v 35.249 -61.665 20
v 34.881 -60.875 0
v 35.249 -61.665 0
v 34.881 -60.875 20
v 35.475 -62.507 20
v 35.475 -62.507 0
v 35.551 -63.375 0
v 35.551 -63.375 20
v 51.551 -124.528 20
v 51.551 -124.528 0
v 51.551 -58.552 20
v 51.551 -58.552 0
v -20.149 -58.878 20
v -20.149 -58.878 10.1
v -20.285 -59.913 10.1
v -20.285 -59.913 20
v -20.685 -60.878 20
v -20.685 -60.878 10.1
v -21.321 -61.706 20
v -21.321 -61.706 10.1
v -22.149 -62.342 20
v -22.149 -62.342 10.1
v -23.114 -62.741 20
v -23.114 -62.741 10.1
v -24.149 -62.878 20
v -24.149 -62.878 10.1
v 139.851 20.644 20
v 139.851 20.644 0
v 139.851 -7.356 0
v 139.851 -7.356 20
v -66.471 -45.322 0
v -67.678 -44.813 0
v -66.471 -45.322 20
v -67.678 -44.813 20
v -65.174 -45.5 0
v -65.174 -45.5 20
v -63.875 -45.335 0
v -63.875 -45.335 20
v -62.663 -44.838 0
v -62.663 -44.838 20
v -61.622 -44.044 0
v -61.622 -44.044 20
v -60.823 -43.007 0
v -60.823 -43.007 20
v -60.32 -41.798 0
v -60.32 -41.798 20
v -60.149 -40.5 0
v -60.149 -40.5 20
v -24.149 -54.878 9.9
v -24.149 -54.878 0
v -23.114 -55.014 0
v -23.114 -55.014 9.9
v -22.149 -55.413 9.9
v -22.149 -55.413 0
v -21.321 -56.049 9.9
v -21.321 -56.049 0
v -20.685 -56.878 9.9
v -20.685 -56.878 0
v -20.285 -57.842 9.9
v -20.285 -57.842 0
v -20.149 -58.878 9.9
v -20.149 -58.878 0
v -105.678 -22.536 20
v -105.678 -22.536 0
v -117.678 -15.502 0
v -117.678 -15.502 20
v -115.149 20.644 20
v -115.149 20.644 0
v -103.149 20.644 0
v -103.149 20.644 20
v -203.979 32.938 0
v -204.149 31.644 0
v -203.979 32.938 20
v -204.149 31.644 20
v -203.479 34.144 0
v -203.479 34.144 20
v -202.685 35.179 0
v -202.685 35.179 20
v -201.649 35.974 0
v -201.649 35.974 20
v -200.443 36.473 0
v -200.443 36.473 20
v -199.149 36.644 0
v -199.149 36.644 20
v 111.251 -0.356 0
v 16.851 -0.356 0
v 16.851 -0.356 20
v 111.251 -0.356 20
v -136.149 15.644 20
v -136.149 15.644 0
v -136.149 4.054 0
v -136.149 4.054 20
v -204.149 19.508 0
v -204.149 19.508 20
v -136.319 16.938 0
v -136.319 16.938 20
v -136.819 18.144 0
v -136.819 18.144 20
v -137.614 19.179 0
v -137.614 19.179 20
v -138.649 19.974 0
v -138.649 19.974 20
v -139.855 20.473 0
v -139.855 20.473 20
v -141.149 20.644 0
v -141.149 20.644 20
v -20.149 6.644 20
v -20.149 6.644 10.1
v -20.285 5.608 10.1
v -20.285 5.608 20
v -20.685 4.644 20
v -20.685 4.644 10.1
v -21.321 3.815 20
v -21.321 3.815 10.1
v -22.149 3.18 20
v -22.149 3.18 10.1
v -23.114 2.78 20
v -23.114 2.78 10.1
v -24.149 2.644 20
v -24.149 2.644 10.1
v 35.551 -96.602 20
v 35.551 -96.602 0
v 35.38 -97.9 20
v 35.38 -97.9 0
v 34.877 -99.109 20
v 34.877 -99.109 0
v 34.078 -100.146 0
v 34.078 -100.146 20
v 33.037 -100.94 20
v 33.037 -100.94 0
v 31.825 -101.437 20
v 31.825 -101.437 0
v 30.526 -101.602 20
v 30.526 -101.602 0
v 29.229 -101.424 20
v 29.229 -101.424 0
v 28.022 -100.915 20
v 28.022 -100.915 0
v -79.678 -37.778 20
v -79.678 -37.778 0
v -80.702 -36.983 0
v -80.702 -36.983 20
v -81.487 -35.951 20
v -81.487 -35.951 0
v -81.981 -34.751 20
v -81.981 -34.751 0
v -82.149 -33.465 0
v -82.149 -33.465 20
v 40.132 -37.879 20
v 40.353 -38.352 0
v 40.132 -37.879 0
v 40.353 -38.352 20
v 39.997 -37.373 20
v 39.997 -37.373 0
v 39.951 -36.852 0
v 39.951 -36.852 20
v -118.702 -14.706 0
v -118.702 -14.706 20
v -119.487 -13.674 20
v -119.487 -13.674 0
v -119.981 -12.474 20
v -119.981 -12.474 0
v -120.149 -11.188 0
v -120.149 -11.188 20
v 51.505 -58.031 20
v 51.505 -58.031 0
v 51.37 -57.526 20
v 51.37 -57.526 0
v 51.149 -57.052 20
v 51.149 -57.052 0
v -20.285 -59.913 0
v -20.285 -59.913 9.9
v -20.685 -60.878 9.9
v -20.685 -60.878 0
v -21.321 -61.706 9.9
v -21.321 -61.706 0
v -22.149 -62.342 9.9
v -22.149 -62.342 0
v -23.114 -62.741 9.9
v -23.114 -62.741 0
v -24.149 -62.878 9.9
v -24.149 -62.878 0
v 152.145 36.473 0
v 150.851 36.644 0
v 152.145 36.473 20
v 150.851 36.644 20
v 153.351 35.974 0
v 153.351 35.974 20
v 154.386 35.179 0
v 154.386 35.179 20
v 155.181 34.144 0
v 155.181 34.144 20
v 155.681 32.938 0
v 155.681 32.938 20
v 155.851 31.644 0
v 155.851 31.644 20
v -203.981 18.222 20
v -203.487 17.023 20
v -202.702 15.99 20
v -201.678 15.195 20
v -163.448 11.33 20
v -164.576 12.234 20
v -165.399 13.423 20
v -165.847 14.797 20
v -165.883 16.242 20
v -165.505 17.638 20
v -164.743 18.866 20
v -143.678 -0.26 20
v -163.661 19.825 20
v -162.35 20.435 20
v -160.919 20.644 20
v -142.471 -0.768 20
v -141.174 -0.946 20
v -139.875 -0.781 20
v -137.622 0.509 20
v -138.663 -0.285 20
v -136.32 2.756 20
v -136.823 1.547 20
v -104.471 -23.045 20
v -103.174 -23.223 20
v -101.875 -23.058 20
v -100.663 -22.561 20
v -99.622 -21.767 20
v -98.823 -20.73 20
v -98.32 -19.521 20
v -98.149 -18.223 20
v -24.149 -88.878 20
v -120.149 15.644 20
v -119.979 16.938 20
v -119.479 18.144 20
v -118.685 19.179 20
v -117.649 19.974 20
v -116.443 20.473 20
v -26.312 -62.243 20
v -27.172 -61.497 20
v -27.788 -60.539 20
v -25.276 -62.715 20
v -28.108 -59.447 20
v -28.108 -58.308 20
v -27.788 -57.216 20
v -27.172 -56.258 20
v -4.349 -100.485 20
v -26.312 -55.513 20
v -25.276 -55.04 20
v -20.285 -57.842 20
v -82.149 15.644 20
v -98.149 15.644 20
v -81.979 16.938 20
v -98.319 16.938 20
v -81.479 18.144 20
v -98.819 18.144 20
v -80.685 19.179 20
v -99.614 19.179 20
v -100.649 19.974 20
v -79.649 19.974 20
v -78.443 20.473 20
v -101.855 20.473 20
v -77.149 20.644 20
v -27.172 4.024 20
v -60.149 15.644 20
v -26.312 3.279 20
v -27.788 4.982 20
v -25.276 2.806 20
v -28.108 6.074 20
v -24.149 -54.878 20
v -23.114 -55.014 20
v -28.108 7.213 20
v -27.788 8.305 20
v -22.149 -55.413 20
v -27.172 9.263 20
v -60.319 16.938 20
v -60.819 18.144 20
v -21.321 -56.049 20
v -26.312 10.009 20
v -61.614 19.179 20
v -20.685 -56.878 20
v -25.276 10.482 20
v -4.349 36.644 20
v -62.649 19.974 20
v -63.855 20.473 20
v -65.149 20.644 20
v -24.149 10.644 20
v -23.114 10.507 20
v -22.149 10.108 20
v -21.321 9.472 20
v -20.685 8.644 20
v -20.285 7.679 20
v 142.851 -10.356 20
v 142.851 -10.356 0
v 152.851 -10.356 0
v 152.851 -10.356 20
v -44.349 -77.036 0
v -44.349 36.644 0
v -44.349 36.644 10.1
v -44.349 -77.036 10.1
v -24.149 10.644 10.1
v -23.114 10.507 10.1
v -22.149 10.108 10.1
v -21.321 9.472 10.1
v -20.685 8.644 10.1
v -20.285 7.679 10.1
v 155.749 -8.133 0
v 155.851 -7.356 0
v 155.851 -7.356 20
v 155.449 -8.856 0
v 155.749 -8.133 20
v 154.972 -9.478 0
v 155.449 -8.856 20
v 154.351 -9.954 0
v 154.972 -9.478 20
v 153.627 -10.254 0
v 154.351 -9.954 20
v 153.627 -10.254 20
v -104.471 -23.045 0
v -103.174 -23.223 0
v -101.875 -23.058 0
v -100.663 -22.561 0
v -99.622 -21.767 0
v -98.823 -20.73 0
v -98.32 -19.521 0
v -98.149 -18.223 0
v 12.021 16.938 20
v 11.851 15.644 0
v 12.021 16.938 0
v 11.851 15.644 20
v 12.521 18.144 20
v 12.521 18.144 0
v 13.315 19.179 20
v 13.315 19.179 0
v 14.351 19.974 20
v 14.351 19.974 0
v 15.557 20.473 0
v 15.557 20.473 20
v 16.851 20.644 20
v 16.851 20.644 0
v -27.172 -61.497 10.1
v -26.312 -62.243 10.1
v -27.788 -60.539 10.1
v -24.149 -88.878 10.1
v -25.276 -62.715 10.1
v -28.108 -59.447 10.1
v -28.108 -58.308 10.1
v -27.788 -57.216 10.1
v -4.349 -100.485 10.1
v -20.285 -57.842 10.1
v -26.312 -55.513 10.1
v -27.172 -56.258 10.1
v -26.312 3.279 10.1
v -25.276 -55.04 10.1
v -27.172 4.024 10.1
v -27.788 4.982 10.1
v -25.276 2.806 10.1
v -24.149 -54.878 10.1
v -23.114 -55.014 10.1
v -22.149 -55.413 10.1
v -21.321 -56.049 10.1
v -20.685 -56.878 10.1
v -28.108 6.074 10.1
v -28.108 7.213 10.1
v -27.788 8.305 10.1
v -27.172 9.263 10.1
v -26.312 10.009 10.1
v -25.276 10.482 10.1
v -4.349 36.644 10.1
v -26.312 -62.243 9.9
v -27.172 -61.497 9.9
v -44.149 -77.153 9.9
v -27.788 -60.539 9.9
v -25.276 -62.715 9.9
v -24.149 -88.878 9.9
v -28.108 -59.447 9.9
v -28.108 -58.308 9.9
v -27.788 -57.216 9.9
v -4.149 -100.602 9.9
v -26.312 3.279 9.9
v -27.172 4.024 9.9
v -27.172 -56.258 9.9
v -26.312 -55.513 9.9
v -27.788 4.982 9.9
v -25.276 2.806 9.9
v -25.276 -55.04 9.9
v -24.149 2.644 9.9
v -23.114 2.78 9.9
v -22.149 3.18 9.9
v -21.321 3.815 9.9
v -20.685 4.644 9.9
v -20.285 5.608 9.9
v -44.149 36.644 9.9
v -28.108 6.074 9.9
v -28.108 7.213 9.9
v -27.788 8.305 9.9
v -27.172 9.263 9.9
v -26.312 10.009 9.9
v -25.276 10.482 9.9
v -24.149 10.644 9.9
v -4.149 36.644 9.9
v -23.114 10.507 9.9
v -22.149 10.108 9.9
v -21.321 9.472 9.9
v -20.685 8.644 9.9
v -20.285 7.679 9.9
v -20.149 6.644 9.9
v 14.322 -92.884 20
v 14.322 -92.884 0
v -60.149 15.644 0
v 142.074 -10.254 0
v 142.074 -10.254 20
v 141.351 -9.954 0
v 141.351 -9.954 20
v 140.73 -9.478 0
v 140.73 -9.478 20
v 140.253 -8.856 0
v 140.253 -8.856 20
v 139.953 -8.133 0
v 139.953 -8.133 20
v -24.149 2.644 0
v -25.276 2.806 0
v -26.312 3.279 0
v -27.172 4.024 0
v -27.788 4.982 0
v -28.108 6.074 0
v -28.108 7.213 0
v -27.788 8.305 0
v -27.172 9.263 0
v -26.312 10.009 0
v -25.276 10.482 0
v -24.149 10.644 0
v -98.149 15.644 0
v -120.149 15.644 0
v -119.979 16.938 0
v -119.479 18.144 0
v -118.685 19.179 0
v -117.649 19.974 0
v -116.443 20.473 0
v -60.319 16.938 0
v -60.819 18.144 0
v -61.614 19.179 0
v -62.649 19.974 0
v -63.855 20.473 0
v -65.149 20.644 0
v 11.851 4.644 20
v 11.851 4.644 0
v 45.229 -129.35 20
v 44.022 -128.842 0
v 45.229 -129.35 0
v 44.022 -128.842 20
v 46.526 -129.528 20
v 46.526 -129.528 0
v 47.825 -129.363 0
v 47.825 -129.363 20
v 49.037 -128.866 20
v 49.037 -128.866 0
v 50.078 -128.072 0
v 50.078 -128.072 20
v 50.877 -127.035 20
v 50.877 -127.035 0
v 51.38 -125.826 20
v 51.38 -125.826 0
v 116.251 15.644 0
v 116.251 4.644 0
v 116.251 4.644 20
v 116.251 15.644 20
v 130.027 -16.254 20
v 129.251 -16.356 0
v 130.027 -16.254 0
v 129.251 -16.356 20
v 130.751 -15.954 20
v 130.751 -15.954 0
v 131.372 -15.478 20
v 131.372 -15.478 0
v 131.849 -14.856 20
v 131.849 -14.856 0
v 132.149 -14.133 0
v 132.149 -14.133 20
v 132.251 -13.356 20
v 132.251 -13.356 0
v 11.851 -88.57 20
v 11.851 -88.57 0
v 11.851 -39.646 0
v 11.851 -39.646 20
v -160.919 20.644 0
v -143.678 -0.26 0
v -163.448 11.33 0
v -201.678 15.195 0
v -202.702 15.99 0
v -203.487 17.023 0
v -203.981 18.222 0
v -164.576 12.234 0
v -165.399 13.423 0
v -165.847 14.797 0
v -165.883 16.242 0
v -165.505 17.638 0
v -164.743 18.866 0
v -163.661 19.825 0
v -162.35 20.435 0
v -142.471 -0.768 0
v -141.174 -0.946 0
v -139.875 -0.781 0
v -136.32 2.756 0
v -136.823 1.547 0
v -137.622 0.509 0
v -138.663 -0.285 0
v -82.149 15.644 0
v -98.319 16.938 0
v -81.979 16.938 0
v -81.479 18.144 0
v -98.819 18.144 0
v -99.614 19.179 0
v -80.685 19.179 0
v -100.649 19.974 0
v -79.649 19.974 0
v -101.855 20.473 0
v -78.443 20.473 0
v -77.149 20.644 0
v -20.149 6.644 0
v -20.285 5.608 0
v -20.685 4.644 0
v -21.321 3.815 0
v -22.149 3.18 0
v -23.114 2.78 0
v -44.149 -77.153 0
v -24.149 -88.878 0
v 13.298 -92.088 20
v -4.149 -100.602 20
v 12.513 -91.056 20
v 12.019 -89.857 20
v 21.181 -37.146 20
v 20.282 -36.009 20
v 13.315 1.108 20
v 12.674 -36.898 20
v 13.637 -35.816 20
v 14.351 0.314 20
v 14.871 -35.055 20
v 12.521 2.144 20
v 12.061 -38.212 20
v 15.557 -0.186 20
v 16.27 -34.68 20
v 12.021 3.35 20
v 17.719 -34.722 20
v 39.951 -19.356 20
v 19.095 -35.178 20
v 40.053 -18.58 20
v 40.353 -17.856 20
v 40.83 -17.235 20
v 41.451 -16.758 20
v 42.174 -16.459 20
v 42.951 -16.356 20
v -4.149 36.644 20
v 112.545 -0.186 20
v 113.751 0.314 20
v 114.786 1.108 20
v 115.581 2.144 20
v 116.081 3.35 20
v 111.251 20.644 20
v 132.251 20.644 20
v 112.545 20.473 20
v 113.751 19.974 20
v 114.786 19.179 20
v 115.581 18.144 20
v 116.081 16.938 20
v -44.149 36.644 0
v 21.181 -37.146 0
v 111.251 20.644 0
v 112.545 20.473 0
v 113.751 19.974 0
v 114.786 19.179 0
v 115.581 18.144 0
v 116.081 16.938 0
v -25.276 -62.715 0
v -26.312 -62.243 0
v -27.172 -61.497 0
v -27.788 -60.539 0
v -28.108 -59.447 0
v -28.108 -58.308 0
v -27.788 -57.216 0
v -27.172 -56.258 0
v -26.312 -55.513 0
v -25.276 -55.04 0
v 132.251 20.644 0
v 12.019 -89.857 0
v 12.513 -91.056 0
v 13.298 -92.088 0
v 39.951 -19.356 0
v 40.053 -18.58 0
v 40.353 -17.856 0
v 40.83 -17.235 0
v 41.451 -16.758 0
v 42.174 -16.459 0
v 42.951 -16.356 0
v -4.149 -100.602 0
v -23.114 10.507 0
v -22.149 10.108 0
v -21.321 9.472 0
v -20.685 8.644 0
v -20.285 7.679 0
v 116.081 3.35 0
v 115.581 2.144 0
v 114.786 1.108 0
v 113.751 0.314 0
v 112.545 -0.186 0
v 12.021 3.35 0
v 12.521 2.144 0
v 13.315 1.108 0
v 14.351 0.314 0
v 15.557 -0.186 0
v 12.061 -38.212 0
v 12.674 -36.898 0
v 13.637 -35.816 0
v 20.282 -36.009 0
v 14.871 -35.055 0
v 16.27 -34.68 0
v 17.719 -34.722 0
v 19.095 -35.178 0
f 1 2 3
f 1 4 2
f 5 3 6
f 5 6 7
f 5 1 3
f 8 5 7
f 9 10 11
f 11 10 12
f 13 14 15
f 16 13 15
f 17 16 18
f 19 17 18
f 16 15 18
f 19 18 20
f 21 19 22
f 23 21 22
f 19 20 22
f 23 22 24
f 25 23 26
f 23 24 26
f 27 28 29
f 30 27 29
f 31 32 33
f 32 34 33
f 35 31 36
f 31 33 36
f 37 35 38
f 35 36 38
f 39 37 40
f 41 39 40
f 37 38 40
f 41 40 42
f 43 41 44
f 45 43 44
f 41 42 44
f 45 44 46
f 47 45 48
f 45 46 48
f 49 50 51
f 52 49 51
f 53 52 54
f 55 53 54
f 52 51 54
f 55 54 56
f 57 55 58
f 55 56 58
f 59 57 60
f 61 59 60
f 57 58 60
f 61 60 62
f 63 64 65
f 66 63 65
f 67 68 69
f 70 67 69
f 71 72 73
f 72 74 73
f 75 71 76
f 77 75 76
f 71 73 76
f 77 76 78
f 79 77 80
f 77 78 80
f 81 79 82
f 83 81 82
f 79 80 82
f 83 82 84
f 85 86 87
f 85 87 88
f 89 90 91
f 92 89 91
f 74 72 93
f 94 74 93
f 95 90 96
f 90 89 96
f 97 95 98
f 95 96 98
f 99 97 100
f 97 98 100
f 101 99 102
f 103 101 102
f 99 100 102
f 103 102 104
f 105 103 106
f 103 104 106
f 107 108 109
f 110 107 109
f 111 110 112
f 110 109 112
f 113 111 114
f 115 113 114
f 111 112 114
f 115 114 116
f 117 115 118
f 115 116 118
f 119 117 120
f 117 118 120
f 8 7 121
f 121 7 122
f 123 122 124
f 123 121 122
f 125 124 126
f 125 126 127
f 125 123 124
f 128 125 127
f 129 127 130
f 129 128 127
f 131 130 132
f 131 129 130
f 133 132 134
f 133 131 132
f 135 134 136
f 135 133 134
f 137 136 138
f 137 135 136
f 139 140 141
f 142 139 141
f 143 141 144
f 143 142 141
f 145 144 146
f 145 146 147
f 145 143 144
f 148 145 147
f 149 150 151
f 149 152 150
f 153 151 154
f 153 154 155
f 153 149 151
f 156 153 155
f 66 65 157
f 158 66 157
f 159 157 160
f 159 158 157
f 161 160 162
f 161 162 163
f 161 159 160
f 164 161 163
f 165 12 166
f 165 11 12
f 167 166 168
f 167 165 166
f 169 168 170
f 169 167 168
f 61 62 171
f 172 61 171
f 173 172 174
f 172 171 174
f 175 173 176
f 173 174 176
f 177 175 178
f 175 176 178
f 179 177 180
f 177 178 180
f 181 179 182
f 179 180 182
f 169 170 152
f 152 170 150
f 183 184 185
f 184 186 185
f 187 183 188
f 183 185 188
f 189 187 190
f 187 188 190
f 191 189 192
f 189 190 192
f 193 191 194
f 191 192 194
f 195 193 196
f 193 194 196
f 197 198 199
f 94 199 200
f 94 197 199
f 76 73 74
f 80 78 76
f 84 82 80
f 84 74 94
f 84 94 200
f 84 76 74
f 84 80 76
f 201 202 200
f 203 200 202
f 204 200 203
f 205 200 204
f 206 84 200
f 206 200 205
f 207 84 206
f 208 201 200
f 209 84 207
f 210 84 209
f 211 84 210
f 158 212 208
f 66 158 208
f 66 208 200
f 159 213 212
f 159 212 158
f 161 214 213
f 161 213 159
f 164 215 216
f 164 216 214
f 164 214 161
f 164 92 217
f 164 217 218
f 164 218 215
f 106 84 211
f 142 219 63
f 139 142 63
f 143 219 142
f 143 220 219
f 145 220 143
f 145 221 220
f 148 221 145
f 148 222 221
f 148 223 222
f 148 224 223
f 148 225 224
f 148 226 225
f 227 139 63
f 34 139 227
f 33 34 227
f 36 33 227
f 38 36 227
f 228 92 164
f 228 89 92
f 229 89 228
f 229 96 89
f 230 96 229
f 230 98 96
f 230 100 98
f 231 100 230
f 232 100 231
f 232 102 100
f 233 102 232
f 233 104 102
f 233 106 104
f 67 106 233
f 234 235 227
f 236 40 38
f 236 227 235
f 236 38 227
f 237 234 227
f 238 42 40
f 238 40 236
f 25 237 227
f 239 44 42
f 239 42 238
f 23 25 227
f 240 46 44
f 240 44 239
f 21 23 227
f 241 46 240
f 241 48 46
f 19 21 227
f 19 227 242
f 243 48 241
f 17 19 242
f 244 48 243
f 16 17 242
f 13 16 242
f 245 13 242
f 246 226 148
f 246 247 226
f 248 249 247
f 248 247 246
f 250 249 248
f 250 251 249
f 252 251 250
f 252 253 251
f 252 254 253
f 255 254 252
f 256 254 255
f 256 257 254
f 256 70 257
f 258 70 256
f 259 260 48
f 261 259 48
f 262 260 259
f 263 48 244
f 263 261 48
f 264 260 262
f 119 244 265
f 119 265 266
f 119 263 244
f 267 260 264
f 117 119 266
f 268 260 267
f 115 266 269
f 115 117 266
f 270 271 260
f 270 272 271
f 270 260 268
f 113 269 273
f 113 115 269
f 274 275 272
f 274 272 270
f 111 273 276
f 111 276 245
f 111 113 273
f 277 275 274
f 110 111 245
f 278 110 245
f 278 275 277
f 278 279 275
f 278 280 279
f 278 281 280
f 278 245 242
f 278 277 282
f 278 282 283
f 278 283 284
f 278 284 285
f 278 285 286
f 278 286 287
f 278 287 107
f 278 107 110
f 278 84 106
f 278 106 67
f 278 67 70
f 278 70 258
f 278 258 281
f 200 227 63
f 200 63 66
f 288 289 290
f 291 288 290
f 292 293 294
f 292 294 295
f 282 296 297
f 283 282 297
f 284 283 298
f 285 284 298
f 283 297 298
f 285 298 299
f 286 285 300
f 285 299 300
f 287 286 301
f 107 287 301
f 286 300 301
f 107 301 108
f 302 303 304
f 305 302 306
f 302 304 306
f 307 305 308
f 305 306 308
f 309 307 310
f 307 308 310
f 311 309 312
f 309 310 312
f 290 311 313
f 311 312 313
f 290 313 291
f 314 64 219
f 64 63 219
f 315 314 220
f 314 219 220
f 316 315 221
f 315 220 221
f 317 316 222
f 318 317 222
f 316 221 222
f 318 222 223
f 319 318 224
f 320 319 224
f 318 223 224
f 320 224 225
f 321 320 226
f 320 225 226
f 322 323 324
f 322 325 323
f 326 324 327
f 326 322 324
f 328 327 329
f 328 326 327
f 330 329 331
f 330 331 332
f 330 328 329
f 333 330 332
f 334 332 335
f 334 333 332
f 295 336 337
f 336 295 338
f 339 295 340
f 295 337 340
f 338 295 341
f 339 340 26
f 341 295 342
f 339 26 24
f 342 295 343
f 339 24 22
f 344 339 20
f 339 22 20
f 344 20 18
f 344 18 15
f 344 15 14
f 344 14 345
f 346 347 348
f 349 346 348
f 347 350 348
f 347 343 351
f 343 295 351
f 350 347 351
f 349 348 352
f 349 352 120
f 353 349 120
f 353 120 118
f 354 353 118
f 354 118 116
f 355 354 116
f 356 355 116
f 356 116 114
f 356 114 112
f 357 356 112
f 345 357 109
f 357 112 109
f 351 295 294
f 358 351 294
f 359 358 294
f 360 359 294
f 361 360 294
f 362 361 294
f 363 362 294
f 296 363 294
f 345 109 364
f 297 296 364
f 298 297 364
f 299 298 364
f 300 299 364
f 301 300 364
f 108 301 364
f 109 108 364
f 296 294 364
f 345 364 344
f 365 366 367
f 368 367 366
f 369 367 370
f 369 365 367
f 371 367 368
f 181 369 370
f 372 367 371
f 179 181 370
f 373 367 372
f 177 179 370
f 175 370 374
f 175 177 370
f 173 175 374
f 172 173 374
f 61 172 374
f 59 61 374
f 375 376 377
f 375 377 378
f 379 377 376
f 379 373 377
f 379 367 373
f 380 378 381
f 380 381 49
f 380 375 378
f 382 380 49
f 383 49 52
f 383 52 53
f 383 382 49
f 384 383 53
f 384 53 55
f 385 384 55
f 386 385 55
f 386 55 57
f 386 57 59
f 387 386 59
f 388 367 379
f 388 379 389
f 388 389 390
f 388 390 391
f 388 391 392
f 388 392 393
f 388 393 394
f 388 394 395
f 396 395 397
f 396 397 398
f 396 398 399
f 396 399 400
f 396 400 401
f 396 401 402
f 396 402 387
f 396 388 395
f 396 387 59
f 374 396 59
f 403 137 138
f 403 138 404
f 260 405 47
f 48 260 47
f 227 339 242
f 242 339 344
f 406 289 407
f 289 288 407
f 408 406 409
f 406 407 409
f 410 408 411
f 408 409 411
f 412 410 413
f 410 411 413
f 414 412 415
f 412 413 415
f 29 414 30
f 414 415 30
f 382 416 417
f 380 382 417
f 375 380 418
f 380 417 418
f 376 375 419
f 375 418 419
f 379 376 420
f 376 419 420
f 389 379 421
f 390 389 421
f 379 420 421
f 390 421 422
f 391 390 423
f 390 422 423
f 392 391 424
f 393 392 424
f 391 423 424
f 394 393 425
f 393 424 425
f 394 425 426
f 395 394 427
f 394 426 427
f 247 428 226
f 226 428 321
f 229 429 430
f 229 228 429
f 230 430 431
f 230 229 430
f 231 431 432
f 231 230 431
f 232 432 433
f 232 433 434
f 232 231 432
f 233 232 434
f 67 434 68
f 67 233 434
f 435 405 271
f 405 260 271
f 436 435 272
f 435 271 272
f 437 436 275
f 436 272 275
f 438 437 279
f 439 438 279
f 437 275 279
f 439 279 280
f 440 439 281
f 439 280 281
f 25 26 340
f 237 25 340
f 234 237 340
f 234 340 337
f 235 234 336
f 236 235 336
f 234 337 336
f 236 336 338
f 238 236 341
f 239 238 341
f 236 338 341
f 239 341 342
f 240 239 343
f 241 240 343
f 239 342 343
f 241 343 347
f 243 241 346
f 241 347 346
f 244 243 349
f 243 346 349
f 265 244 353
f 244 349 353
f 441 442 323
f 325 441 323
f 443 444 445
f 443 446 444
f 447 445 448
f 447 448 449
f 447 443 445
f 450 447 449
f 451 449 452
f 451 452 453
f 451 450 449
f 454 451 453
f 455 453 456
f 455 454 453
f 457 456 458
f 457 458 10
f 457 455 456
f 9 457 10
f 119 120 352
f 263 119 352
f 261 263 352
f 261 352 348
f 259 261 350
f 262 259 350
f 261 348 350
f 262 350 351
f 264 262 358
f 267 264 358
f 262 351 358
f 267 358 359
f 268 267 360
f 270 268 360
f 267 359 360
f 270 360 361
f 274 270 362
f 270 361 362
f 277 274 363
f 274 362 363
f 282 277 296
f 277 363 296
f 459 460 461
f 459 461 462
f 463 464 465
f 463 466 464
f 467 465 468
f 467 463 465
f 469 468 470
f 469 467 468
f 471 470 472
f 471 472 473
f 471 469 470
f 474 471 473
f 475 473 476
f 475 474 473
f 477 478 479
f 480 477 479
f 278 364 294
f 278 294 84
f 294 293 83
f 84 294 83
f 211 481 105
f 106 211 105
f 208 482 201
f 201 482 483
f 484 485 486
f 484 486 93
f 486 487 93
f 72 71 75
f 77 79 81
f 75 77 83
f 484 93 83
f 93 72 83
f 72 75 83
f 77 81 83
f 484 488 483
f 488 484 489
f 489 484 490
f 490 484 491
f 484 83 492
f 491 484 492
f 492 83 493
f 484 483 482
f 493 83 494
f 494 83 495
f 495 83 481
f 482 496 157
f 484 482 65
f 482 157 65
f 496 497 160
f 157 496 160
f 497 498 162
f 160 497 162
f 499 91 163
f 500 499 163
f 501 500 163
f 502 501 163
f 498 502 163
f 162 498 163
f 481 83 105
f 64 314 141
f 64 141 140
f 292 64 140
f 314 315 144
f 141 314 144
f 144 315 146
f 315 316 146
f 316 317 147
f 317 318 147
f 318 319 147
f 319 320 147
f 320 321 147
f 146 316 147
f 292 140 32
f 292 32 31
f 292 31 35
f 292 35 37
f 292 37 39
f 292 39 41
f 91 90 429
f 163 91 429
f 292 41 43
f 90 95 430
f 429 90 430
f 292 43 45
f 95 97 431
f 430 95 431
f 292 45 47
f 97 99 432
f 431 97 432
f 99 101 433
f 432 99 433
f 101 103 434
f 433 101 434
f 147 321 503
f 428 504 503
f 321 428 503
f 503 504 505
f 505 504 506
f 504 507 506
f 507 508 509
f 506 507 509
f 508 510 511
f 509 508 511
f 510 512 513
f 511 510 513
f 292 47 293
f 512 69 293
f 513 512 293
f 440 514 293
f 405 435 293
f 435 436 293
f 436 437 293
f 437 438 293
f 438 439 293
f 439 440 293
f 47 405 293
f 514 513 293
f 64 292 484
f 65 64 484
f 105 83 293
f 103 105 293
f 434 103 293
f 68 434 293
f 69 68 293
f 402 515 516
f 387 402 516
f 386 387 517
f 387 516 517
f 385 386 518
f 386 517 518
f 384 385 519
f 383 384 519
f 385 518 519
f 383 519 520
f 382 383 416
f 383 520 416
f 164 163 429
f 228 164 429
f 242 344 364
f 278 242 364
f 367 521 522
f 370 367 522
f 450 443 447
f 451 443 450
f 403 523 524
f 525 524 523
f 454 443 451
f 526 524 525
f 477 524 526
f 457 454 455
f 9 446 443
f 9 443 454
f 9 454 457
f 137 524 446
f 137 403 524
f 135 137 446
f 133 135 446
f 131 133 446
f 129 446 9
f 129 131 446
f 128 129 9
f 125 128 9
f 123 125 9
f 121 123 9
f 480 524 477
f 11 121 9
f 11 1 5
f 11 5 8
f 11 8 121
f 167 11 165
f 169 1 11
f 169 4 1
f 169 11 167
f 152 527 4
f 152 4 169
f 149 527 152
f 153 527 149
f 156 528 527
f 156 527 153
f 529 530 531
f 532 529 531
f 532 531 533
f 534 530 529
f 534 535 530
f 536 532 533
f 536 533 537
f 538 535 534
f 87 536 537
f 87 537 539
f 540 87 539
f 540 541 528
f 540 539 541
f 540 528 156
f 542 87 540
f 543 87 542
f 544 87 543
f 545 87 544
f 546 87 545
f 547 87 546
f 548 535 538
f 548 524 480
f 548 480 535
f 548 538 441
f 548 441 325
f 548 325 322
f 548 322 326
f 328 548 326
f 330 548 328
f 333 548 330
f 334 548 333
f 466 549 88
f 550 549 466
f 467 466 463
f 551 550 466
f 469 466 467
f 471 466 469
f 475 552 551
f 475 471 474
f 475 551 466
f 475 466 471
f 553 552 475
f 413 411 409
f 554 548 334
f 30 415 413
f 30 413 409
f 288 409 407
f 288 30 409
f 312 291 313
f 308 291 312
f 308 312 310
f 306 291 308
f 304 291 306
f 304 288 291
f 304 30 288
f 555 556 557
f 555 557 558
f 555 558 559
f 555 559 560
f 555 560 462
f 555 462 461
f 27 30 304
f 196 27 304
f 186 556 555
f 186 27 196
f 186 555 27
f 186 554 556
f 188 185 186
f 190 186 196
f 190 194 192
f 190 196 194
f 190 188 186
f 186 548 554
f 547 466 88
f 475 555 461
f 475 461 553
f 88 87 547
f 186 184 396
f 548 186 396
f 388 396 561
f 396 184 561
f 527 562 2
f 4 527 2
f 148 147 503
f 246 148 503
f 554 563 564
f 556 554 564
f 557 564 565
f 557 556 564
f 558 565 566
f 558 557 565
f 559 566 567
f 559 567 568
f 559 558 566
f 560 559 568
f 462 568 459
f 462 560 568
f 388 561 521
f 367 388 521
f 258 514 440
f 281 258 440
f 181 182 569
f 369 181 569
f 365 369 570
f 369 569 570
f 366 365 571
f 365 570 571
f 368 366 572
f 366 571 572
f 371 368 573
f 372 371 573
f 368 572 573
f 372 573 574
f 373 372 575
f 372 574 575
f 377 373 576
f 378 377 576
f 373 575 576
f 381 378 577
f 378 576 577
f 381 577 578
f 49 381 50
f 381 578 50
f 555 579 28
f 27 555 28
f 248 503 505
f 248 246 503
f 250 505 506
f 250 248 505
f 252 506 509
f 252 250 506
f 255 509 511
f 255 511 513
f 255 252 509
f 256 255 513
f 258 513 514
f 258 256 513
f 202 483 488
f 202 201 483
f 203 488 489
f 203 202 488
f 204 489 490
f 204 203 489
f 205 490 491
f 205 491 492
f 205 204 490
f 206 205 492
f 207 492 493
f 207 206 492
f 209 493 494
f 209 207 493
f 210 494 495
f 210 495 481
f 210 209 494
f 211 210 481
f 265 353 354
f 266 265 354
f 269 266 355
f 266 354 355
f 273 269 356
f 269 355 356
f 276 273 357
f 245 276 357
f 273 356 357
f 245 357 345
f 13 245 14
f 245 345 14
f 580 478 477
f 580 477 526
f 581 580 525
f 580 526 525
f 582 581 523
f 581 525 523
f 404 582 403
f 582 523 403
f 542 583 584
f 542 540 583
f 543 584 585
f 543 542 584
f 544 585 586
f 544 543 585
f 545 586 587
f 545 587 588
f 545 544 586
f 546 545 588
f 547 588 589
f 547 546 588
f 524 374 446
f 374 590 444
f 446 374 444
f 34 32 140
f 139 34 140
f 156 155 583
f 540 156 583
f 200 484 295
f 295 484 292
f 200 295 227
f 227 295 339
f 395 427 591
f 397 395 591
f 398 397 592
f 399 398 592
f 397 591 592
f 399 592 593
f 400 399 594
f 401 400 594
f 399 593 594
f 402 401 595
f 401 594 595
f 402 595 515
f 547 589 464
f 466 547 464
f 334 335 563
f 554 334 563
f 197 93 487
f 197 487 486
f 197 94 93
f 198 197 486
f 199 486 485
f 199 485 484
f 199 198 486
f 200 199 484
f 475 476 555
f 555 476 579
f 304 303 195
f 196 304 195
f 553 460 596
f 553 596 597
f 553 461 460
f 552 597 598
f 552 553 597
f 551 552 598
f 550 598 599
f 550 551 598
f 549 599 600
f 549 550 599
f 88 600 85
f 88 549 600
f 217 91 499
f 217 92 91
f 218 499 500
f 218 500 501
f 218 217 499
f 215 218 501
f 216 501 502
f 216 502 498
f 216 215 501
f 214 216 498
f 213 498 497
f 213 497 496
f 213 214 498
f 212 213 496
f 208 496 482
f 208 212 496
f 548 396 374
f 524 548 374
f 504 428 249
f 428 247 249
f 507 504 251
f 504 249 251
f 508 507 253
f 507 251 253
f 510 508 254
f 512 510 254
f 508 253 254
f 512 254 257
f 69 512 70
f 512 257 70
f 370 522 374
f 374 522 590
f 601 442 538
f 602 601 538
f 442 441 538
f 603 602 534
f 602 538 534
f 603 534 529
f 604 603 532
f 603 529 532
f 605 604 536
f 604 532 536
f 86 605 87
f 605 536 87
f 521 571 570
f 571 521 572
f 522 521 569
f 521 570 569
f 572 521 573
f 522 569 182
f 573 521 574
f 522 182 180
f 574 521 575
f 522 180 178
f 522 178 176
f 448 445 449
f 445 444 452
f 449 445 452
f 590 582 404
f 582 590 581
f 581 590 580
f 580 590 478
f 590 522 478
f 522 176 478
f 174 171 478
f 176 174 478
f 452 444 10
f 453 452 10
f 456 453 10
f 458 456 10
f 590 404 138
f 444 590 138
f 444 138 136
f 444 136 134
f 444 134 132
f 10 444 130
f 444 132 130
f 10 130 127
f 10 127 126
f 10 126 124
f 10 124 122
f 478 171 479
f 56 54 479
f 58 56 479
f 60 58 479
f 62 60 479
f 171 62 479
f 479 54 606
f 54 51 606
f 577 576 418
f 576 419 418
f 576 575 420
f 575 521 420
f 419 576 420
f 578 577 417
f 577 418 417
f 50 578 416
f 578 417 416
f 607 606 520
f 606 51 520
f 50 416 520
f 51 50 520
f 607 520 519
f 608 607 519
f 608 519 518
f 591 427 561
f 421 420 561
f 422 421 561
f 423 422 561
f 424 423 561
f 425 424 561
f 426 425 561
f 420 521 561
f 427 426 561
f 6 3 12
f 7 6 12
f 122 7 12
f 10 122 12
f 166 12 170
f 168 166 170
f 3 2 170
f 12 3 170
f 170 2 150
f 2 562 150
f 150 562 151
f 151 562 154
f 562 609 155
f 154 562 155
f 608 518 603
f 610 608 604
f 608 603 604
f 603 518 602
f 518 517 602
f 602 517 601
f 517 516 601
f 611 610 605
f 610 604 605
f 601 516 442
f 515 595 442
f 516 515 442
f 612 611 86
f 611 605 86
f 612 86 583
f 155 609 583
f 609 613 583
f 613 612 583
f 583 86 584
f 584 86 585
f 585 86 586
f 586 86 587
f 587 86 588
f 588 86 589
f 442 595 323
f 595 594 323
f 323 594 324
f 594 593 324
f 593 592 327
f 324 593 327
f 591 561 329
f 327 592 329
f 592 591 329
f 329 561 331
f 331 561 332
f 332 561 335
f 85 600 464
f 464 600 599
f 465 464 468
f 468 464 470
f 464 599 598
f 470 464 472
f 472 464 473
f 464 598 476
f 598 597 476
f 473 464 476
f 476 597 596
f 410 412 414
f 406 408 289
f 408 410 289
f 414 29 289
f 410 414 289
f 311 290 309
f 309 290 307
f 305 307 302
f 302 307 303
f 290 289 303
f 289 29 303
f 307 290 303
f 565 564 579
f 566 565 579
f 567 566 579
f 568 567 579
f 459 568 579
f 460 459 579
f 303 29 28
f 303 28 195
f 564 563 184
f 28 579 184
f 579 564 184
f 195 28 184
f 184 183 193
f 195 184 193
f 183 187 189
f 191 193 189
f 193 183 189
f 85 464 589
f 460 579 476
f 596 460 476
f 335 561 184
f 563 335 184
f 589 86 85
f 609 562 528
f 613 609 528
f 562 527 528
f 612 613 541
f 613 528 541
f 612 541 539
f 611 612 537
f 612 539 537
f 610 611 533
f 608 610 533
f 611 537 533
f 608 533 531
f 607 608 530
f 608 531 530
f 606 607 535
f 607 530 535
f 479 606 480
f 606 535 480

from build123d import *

# Parameters (mm, degrees)
F0_W     = 104.4
F0_H     = 21
F1_DEPTH = 20
F2_DEPTH = 9.9
F3_DEPTH = 20
F4_DEPTH = 10.1
F5_DEPTH = 0.2
F6_R     = 5
F6_2_R   = 5
F7_R     = 3


with BuildPart() as f1:
    # F0 (on Top) → F1 (new body)
    with BuildSketch(Plane.XY):
        Polygon((155.8509568507, -10.3563018057), (155.8509568507, 36.6436981943), (-4.1490431493, 36.6436981943), (-4.1490431493, -100.6021034165), (51.5509568507, -133.2550591652), (51.5509568507, -57.7480911735), (39.9509568507, -37.6563018057), (39.9509568507, -16.3563018057), (132.2509568507, -16.3563018057), (132.2509568507, 20.6436981943), (139.8509568507, 20.6436981943), (139.8509568507, -10.3563018057), align=None)
        Polygon((11.8509568507, -91.4351209706), (11.8509568507, -20.985674113), (35.5509568507, -62.0352782524), (35.5509568507, -105.3287484615), align=None, mode=Mode.SUBTRACT)
        with Locations((64.0509568507, 10.1436981943)):
            Rectangle(F0_W, F0_H, mode=Mode.SUBTRACT)
    extrude(amount=F1_DEPTH)

    # F0 (on Top) → F2 (join)
    with BuildSketch(Plane.XY):
        with BuildLine():
            Line((-4.1490431493, -100.6021034165), (-4.1490431493, 36.6436981943))
            Line((-4.1490431493, 36.6436981943), (-24.1490431493, 36.6436981943))
            Line((-24.1490431493, 36.6436981943), (-24.1490431493, 10.6436981943))
            ThreePointArc((-24.1490431493, 10.6436981943), (-21.3206160245, 9.472125319), (-20.1490431493, 6.6436981943))
            ThreePointArc((-20.1490431493, 6.6436981943), (-21.3206160245, 3.8152710695), (-24.1490431493, 2.6436981943))
            Line((-24.1490431493, 2.6436981943), (-24.1490431493, -54.8775232555))
            ThreePointArc((-24.1490431493, -54.8775232555), (-21.3206160245, -56.0490961307), (-20.1490431493, -58.8775232555))
            ThreePointArc((-20.1490431493, -58.8775232555), (-21.3206160245, -61.7059503802), (-24.1490431493, -62.8775232555))
            Line((-24.1490431493, -62.8775232555), (-24.1490431493, -88.8775232555))
            Line((-24.1490431493, -88.8775232555), (-4.1490431493, -100.6021034165))
        make_face()
        with BuildLine():
            Line((-24.1490431493, 10.6436981943), (-24.1490431493, 36.6436981943))
            Line((-24.1490431493, 36.6436981943), (-44.1490431493, 36.6436981943))
            Line((-44.1490431493, 36.6436981943), (-44.1490431493, -77.1529430944))
            Line((-44.1490431493, -77.1529430944), (-24.1490431493, -88.8775232555))
            Line((-24.1490431493, -88.8775232555), (-24.1490431493, -62.8775232555))
            ThreePointArc((-24.1490431493, -62.8775232555), (-28.1490431493, -58.8775232555), (-24.1490431493, -54.8775232555))
            Line((-24.1490431493, -54.8775232555), (-24.1490431493, 2.6436981943))
            ThreePointArc((-24.1490431493, 2.6436981943), (-28.1490431493, 6.6436981943), (-24.1490431493, 10.6436981943))
        make_face()
    extrude(amount=F2_DEPTH)

    # F6
    f6_edges = [f1.edges().sort_by_distance(p)[0] for p in [
        (35.550957, -105.328748, 10),
        (11.850957, -91.435121, 10),
        (11.850957, -20.985674, 10),
        (35.550957, -62.035278, 10),
        (11.850957, 20.643698, 10),
        (11.850957, -0.356302, 10),
        (116.250957, -0.356302, 10),
        (116.250957, 20.643698, 10),
        (155.850957, 36.643698, 10),
        (51.550957, -133.255059, 10),
    ]]
    fillet(f6_edges, radius=F6_R)

    # F7
    f7_edges = [f1.edges().sort_by_distance(p)[0] for p in [
        (132.250957, -16.356302, 10),
        (139.850957, -10.356302, 10),
        (155.850957, -10.356302, 10),
        (51.550957, -57.748091, 10),
        (39.950957, -37.656302, 10),
        (39.950957, -16.356302, 10),
    ]]
    fillet(f7_edges, radius=F7_R)


with BuildPart() as f3:
    # F0 (on Top) → F3 (new body)
    with BuildSketch(Plane.XY):
        Polygon((-44.1490431493, -77.1529430944), (-44.1490431493, 36.6436981943), (-204.1490431493, 36.6436981943), (-204.1490431493, 16.6436981943), align=None)
        Polygon((-82.1490431493, 20.6436981943), (-60.1490431493, 20.6436981943), (-60.1490431493, -49.2266323907), (-82.1490431493, -36.3295942135), (-98.1490431493, -26.9499300847), (-120.1490431493, -14.0528919075), (-136.1490431493, -4.6732277786), (-179.335111435, 20.6436981943), (-136.1490431493, 20.6436981943), (-120.1490431493, 20.6436981943), (-98.1490431493, 20.6436981943), align=None, mode=Mode.SUBTRACT)
        with BuildLine():
            Line((-4.1490431493, -100.6021034165), (-4.1490431493, 36.6436981943))
            Line((-4.1490431493, 36.6436981943), (-24.1490431493, 36.6436981943))
            Line((-24.1490431493, 36.6436981943), (-24.1490431493, 10.6436981943))
            ThreePointArc((-24.1490431493, 10.6436981943), (-21.3206160245, 9.472125319), (-20.1490431493, 6.6436981943))
            ThreePointArc((-20.1490431493, 6.6436981943), (-21.3206160245, 3.8152710695), (-24.1490431493, 2.6436981943))
            Line((-24.1490431493, 2.6436981943), (-24.1490431493, -54.8775232555))
            ThreePointArc((-24.1490431493, -54.8775232555), (-21.3206160245, -56.0490961307), (-20.1490431493, -58.8775232555))
            ThreePointArc((-20.1490431493, -58.8775232555), (-21.3206160245, -61.7059503802), (-24.1490431493, -62.8775232555))
            Line((-24.1490431493, -62.8775232555), (-24.1490431493, -88.8775232555))
            Line((-24.1490431493, -88.8775232555), (-4.1490431493, -100.6021034165))
        make_face()
        with BuildLine():
            Line((-24.1490431493, 10.6436981943), (-24.1490431493, 36.6436981943))
            Line((-24.1490431493, 36.6436981943), (-44.1490431493, 36.6436981943))
            Line((-44.1490431493, 36.6436981943), (-44.1490431493, -77.1529430944))
            Line((-44.1490431493, -77.1529430944), (-24.1490431493, -88.8775232555))
            Line((-24.1490431493, -88.8775232555), (-24.1490431493, -62.8775232555))
            ThreePointArc((-24.1490431493, -62.8775232555), (-28.1490431493, -58.8775232555), (-24.1490431493, -54.8775232555))
            Line((-24.1490431493, -54.8775232555), (-24.1490431493, 2.6436981943))
            ThreePointArc((-24.1490431493, 2.6436981943), (-28.1490431493, 6.6436981943), (-24.1490431493, 10.6436981943))
        make_face()
        Polygon((-120.1490431493, -14.0528919075), (-120.1490431493, 20.6436981943), (-136.1490431493, 20.6436981943), (-136.1490431493, -4.6732277786), align=None)
        Polygon((-82.1490431493, -36.3295942135), (-82.1490431493, 20.6436981943), (-98.1490431493, 20.6436981943), (-98.1490431493, -26.9499300847), align=None)
    extrude(amount=F3_DEPTH)

    # F0 (on Top) → F4 (cut)
    with BuildSketch(Plane.XY):
        with BuildLine():
            Line((-24.1490431493, 10.6436981943), (-24.1490431493, 36.6436981943))
            Line((-24.1490431493, 36.6436981943), (-44.1490431493, 36.6436981943))
            Line((-44.1490431493, 36.6436981943), (-44.1490431493, -77.1529430944))
            Line((-44.1490431493, -77.1529430944), (-24.1490431493, -88.8775232555))
            Line((-24.1490431493, -88.8775232555), (-24.1490431493, -62.8775232555))
            ThreePointArc((-24.1490431493, -62.8775232555), (-28.1490431493, -58.8775232555), (-24.1490431493, -54.8775232555))
            Line((-24.1490431493, -54.8775232555), (-24.1490431493, 2.6436981943))
            ThreePointArc((-24.1490431493, 2.6436981943), (-28.1490431493, 6.6436981943), (-24.1490431493, 10.6436981943))
        make_face()
        with BuildLine():
            Line((-4.1490431493, -100.6021034165), (-4.1490431493, 36.6436981943))
            Line((-4.1490431493, 36.6436981943), (-24.1490431493, 36.6436981943))
            Line((-24.1490431493, 36.6436981943), (-24.1490431493, 10.6436981943))
            ThreePointArc((-24.1490431493, 10.6436981943), (-21.3206160245, 9.472125319), (-20.1490431493, 6.6436981943))
            ThreePointArc((-20.1490431493, 6.6436981943), (-21.3206160245, 3.8152710695), (-24.1490431493, 2.6436981943))
            Line((-24.1490431493, 2.6436981943), (-24.1490431493, -54.8775232555))
            ThreePointArc((-24.1490431493, -54.8775232555), (-21.3206160245, -56.0490961307), (-20.1490431493, -58.8775232555))
            ThreePointArc((-20.1490431493, -58.8775232555), (-21.3206160245, -61.7059503802), (-24.1490431493, -62.8775232555))
            Line((-24.1490431493, -62.8775232555), (-24.1490431493, -88.8775232555))
            Line((-24.1490431493, -88.8775232555), (-4.1490431493, -100.6021034165))
        make_face()
    extrude(amount=F4_DEPTH, mode=Mode.SUBTRACT)

    # F5 (cut): faces of the model
    f5_faces = [f3.faces().sort_by_distance(p)[0] for p in [
        (-44.1490431493, -20.2546224501, 5.05),
        (-4.1490431493, -31.9792026111, 15.05),
    ]]
    extrude(f5_faces, amount=-F5_DEPTH, mode=Mode.SUBTRACT)

    # F6#2
    f6_2_edges = [f3.edges().sort_by_distance(p)[0] for p in [
        (-179.335111, 20.643698, 10),
        (-136.149043, 20.643698, 10),
        (-136.149043, -4.673228, 10),
        (-98.149043, -26.94993, 10),
        (-98.149043, 20.643698, 10),
        (-120.149043, 20.643698, 10),
        (-120.149043, -14.052892, 10),
        (-60.149043, 20.643698, 10),
        (-60.149043, -49.226632, 10),
        (-82.149043, -36.329594, 10),
        (-82.149043, 20.643698, 10),
        (-204.149043, 16.643698, 10),
        (-204.149043, 36.643698, 10),
    ]]
    fillet(f6_2_edges, radius=F6_2_R)


solid = Compound([f1.part, f3.part])
